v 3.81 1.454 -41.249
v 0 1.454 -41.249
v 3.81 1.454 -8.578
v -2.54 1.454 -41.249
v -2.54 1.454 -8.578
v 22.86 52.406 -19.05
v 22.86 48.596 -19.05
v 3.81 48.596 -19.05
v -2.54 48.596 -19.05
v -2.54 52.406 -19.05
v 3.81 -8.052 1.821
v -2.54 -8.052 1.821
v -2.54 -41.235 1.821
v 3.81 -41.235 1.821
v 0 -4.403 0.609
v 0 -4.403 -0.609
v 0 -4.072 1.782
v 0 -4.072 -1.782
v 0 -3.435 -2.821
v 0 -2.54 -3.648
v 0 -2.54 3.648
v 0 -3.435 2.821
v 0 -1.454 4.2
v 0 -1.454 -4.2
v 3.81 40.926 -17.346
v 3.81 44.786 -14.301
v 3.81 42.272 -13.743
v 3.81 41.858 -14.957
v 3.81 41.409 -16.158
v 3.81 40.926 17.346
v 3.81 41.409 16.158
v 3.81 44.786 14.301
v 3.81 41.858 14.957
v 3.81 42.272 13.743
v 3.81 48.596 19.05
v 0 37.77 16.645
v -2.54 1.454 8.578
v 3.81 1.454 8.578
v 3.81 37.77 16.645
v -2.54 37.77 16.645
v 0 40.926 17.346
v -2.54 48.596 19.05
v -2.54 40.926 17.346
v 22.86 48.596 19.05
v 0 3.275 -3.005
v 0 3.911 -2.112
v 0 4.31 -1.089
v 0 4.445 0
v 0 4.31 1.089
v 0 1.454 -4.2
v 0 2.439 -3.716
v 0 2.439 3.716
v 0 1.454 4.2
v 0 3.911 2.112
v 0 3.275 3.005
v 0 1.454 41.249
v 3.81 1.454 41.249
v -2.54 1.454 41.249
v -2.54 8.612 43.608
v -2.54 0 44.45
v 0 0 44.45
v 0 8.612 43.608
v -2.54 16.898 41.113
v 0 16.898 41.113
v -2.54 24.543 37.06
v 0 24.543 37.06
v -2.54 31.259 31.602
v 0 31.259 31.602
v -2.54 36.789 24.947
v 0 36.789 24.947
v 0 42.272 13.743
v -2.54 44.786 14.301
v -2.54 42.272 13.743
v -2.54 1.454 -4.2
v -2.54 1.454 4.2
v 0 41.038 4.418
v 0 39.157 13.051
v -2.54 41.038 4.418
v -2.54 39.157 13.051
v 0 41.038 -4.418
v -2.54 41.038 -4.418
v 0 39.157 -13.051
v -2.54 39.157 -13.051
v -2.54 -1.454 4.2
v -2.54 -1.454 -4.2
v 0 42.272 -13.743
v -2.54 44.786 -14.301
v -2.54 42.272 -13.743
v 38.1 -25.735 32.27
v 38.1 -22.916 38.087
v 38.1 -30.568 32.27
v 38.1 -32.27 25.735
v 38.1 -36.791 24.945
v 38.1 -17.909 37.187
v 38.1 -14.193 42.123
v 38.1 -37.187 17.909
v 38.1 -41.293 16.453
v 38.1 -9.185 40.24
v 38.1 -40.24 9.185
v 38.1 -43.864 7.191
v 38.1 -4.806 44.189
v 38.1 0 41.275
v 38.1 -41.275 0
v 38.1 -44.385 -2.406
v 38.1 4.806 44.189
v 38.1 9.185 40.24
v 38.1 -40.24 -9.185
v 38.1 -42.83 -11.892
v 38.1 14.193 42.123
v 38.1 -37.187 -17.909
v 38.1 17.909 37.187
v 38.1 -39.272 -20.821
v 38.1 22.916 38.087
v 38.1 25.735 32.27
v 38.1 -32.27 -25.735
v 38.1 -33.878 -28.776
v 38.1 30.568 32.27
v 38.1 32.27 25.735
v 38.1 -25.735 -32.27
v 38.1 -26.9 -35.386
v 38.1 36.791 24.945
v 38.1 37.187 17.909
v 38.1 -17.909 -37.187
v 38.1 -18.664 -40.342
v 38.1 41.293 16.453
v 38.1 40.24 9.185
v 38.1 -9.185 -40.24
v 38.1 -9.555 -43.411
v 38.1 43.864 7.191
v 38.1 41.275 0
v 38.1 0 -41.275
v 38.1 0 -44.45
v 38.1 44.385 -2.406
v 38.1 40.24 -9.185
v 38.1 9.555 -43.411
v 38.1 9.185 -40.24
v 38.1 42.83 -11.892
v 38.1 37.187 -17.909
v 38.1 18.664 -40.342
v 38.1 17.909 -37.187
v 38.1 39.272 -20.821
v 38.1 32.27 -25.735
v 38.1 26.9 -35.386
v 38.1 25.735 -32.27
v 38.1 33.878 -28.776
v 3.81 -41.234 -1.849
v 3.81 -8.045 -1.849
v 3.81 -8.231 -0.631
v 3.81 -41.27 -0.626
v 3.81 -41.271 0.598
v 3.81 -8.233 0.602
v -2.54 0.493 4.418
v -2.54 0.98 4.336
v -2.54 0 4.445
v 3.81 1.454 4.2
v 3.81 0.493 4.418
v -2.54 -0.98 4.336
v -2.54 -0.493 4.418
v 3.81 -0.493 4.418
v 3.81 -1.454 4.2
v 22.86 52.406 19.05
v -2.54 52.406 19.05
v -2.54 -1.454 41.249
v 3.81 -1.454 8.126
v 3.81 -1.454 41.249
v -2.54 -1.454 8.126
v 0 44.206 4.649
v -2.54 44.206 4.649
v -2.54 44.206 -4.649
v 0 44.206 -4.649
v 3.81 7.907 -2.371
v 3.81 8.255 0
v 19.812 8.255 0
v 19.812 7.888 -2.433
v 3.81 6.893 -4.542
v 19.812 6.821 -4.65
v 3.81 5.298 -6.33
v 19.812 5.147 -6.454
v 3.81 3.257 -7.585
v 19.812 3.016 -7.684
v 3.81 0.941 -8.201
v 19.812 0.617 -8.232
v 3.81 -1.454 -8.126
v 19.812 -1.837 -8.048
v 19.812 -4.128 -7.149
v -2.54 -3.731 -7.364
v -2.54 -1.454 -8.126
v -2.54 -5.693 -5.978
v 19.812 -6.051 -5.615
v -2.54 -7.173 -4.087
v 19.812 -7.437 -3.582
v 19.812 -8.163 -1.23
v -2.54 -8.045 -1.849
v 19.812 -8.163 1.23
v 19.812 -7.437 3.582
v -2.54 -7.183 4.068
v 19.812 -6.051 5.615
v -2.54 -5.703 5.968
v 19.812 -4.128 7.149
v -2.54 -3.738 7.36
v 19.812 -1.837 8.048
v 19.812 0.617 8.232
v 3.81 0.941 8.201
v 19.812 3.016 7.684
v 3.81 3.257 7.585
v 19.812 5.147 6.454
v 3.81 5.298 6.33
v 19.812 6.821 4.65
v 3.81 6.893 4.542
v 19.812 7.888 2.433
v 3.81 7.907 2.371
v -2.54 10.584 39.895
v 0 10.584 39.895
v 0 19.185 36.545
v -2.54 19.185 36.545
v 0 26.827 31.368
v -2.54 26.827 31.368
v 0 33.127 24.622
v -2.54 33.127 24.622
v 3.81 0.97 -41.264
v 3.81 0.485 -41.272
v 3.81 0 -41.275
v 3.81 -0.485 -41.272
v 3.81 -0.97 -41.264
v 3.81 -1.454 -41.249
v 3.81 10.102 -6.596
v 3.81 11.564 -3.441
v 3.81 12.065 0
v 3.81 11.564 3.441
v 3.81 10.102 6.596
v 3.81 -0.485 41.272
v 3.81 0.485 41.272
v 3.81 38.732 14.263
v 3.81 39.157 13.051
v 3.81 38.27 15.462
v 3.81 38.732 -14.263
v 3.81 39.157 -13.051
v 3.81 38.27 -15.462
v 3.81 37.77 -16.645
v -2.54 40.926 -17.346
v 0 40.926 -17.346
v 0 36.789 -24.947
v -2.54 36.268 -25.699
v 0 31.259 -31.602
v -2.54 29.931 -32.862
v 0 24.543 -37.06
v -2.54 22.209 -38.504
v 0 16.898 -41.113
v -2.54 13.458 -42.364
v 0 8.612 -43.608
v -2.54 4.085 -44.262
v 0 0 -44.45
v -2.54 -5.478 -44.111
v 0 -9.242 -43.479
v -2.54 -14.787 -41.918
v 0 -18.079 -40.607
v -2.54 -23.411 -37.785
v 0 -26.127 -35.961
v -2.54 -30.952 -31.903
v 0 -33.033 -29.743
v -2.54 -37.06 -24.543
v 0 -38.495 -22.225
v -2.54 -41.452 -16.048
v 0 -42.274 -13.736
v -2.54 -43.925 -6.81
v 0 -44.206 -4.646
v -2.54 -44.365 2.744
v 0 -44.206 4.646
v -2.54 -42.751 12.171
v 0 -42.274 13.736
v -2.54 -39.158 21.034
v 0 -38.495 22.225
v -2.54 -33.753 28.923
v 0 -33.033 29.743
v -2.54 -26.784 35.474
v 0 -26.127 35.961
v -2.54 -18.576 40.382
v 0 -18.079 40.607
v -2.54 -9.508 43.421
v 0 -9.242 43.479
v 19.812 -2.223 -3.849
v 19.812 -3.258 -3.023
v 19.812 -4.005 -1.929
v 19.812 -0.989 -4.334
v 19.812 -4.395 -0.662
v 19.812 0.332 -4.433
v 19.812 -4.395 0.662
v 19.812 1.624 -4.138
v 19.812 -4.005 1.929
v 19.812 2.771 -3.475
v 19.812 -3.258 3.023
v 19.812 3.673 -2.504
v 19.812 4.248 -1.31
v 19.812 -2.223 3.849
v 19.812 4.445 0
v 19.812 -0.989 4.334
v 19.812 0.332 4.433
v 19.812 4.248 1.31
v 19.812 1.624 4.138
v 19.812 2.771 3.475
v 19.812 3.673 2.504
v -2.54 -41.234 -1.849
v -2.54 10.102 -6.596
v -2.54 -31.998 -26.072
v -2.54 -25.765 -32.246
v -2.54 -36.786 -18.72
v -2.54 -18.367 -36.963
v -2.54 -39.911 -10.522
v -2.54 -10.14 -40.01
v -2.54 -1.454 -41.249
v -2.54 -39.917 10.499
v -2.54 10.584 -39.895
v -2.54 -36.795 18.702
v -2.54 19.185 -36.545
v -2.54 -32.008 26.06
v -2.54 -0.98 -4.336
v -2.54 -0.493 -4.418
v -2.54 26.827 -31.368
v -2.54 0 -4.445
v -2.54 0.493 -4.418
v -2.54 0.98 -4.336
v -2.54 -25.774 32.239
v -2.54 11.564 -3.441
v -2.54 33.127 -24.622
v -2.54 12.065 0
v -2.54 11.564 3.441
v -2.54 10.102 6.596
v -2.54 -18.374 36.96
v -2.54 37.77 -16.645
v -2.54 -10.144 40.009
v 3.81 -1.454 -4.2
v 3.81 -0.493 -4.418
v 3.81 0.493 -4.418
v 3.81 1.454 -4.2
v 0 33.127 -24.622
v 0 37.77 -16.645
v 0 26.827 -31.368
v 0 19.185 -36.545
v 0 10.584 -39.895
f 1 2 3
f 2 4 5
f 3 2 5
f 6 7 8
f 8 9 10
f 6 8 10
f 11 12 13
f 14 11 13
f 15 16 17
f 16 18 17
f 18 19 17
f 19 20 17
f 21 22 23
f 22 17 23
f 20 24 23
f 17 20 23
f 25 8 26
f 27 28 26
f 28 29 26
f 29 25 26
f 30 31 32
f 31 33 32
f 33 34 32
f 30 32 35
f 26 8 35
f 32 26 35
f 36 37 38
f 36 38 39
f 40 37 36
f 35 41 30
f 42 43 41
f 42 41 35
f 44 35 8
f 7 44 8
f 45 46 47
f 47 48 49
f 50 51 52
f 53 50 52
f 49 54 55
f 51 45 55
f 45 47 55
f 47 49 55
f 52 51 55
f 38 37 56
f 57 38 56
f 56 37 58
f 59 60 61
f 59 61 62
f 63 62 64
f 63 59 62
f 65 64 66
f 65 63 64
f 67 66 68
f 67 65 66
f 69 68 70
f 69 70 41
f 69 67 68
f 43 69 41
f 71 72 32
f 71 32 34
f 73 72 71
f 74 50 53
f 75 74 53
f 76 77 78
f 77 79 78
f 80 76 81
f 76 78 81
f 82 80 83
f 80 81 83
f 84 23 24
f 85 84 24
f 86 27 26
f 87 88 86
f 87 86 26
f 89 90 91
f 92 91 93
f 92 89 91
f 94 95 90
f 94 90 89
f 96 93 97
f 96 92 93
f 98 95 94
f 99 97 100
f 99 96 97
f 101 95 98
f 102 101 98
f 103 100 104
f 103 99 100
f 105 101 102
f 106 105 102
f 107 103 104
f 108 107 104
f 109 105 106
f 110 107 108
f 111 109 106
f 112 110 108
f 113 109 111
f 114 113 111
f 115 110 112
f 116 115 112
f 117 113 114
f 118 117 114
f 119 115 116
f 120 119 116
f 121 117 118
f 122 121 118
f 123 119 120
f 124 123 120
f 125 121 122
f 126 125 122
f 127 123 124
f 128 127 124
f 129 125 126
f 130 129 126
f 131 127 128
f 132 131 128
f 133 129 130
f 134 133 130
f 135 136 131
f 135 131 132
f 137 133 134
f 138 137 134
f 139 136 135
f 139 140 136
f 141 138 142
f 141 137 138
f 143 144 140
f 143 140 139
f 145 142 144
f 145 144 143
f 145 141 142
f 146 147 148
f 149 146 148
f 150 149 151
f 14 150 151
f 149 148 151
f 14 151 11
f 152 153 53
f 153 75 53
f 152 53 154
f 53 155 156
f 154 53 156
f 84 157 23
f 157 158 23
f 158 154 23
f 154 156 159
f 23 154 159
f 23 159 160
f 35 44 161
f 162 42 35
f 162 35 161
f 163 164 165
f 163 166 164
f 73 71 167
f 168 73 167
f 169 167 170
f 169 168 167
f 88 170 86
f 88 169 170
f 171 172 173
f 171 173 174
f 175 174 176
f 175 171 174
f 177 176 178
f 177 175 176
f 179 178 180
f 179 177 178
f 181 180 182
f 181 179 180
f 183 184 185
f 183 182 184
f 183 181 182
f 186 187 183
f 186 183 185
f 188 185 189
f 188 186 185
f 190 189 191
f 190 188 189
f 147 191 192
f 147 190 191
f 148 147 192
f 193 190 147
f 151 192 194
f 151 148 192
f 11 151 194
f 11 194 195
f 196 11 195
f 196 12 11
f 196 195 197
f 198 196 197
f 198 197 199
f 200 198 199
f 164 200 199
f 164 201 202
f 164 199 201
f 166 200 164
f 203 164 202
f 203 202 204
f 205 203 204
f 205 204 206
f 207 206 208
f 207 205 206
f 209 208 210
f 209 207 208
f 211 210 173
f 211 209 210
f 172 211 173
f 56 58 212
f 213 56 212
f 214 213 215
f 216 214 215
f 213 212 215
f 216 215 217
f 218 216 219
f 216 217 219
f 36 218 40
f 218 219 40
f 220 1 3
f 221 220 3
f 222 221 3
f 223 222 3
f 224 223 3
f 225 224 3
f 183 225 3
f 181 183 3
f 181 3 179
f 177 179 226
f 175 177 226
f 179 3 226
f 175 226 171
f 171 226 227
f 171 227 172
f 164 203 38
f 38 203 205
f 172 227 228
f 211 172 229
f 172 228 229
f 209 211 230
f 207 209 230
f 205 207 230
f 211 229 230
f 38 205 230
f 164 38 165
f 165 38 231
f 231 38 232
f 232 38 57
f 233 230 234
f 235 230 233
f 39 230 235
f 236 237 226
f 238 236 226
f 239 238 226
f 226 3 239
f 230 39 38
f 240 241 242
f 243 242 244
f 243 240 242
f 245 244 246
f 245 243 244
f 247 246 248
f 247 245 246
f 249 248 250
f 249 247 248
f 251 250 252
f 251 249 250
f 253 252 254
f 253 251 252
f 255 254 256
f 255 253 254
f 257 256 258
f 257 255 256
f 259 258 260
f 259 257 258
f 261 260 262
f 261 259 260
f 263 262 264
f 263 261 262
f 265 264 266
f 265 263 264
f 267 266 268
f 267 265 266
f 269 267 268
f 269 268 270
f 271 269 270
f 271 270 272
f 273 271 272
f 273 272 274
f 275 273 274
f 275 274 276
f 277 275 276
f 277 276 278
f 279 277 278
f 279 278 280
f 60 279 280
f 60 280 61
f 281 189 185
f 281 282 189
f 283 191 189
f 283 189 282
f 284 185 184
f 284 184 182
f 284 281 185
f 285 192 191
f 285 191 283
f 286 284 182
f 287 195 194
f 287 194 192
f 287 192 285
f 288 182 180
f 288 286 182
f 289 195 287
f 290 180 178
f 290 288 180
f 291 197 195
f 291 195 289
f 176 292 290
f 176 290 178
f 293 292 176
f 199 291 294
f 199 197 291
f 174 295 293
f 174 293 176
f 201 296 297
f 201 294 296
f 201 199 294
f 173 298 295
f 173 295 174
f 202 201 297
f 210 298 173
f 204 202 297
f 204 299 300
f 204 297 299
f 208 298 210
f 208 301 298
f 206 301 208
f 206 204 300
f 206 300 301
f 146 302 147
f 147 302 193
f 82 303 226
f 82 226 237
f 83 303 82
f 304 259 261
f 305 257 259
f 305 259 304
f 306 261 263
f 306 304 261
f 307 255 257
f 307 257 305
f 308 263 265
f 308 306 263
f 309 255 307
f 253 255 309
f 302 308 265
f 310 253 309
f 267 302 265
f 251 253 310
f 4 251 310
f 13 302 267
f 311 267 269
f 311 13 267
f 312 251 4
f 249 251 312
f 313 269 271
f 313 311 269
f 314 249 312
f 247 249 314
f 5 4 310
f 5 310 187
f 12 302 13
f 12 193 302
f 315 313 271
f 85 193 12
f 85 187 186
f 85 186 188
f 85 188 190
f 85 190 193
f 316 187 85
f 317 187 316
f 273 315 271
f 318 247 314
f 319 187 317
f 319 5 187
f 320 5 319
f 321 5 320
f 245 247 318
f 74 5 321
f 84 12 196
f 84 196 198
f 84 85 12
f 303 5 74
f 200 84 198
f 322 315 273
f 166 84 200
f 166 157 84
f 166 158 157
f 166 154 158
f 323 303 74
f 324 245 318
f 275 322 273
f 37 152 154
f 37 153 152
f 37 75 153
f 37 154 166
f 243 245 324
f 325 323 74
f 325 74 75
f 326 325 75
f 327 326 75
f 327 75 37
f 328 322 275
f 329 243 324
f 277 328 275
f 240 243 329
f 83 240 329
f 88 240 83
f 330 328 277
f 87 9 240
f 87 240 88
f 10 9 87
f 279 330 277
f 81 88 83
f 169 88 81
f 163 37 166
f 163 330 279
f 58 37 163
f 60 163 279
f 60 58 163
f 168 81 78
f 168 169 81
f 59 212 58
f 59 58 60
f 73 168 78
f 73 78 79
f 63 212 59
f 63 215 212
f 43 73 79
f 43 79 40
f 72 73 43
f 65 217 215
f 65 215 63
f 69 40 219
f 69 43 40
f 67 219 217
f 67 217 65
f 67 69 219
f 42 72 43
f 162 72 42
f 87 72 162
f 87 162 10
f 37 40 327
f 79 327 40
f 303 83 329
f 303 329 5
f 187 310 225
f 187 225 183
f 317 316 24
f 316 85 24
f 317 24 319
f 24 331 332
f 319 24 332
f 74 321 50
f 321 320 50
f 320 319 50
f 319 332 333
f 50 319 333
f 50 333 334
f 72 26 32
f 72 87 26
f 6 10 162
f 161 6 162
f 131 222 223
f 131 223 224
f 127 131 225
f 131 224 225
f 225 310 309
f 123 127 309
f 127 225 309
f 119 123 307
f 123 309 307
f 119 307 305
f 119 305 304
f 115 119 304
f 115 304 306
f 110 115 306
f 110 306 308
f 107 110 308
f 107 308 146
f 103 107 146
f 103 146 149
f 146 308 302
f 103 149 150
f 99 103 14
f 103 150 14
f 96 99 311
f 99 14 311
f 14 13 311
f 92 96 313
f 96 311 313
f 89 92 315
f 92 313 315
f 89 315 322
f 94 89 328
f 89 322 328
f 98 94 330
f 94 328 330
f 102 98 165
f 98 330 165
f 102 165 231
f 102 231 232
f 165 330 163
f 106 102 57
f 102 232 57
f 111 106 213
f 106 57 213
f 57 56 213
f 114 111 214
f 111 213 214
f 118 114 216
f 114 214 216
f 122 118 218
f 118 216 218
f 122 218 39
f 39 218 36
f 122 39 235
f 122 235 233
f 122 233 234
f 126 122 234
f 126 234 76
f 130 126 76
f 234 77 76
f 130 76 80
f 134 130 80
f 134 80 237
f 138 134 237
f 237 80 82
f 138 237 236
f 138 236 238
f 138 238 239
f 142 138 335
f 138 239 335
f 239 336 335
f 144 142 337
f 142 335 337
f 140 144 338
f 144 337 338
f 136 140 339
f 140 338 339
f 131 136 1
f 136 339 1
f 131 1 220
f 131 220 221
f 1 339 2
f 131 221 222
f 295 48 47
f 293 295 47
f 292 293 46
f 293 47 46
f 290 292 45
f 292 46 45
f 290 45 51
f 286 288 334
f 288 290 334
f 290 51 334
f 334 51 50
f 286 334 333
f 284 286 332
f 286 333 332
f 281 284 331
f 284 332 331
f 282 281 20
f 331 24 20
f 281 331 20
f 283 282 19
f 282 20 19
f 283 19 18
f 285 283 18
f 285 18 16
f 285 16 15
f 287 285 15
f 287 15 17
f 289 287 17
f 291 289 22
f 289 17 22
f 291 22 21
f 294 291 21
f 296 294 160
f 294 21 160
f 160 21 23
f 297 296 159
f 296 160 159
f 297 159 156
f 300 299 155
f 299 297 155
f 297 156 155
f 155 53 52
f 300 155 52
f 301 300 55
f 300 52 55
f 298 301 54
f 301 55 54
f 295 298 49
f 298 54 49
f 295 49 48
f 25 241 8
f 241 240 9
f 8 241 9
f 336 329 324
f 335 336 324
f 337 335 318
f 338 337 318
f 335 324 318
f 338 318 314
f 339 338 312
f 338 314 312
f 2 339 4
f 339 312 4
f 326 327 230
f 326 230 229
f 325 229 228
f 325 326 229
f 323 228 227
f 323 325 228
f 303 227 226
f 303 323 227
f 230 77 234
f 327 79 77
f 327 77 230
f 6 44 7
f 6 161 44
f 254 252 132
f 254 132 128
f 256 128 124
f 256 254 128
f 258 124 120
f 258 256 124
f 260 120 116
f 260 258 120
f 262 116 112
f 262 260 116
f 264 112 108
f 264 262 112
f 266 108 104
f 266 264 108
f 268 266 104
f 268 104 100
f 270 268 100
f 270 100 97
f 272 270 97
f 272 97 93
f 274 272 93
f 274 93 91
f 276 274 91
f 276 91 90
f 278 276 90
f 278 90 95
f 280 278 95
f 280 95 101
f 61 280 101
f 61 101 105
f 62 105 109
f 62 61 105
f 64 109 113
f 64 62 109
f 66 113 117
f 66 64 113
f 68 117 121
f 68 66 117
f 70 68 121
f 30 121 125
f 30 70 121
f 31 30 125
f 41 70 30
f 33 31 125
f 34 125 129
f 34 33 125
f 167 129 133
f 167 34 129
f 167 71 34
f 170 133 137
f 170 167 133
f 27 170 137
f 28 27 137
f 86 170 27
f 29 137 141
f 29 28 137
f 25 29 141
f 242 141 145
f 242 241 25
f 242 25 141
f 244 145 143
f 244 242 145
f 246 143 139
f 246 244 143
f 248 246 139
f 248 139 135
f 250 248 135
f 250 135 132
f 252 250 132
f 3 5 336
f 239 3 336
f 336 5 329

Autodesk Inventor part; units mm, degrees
ref_plane "YZ Plane" through (0, 0, 0) normal (1, 0, 0) x (0, 1, 0)
ref_plane "XZ Plane" through (0, 0, 0) normal (0, 1, 0) x (-1, 0, 0)
ref_plane "XY Plane" through (0, 0, 0) normal (0, 0, 1) x (1, 0, 0)
sketch "Sketch1" plane through (0, 0, 0) normal (1, 0, 0) x (0, 1, 0)
  circle A0 centre (0, 0) radius 4.445
  circle A1 centre (0, 0) radius 8.255
  dimension "d0" = 8.89
  dimension "d1" = 3.81
extrude "Extrusion1" add sketch "Sketch1" along normal blind 19.812
sketch "Sketch2" plane through (0, 0, 0) normal (-1, 0, 0) x (0, 0, 1)
  circle A0 centre (0, 0) radius 8.255
  circle A1 centre (0, 0) radius 7.747
  circle A2 centre (0, 0) radius 8.255 projected
  dimension "d42" = 0
extrude "Extrusion2" add sketch "Sketch2" along normal blind 2.54 contours A0 | A1
sketch "Sketch3" plane through (-2.54, 0, 0) normal (-1, 0, 0) x (0, 0, 1)
  line L0 (19.05, 48.5955) -> (-19.05, 48.5955)
  circle A0 centre (0, 0) radius 8.255 projected
  line L1 (8.255, 0) -> (19.05, 48.5955)
  line L2 (-8.255, 0) -> (-19.05, 48.5955)
  arc A1 (8.255, 0) -> (-8.255, 0) centre (0, 0) ccw
  line L3 (-14.3008, 44.7855) -> (14.3008, 44.7855)
  line L4 (14.3008, 44.7855) -> (6.5962, 10.1022)
  arc A2 (6.5962, 10.1022) -> (-6.5962, 10.1022) centre (0, 0) ccw
  line L5 (-6.5962, 10.1022) -> (-14.3008, 44.7855)
  dimension "d6" = 38.1
  dimension "d7" = 19.05
  dimension "d8" = 3.81
extrude "Extrusion3" add sketch "Sketch3" against normal blind 6.35 contours L1 A0 L2 L0
sketch "Sketch6" plane through (-2.54, 44.7855, -14.3008) normal (0, -1, 0) x (1, 0, 0)
  line L0 (6.35, 32.4159) -> (26.9875, 32.4159) projected
  line L1 (13.4874, 32.4159) -> (13.4874, 26.0989)
  line L2 (26.9875, 32.4159) -> (26.9875, -3.9117) projected
  point P0 (2.54, 14.3008)
  dimension "d20" = 13.5001
sketch "Sketch10" plane through (0, 0, 0) normal (1, 0, 0) x (0, 0, -1)
  circle A0 centre (0, 0) radius 1.4542
  line L0 (-4.445, 1.4542) -> (4.445, 1.4542)
  line L1 (4.445, 1.4542) -> (4.445, -1.4542)
  line L2 (4.445, -1.4542) -> (-4.445, -1.4542)
  line L3 (-4.445, -1.4542) -> (-4.445, 1.4542)
  circle A1 centre (0, 0) radius 4.445 projected
  dimension "d43" = 0
  dimension "d44" = 0
extrude "Extrusion7" cut sketch "Sketch10" against normal blind 22.225 contours A0 | A0 L0 A1 L2 | A0 L2 A1 L0 | A1 L3 L0 | L0 L1 A1 | A1 L1 L2 | L2 L3 A1
sketch "Sketch13" plane through (-2.54, 48.5955, 19.05) normal (0, 1, 0) x (1, 0, 0)
  line L0 (4.6355, 36.83) -> (1.7145, 36.83)
  line L1 (1.7145, 36.83) -> (1.7145, 33.909)
  line L2 (1.7145, 33.909) -> (4.6355, 33.909)
  line L3 (4.6355, 33.909) -> (4.6355, 36.83)
  line L4 (6.35, 38.1) -> (6.35, 0) projected
  line L5 (0, 38.1) -> (6.35, 38.1) projected
  line L6 (4.6228, 4.191) -> (1.7018, 4.191)
  line L7 (1.7018, 4.191) -> (1.7018, 1.27)
  line L8 (1.7018, 1.27) -> (4.6228, 1.27)
  line L9 (4.6228, 1.27) -> (4.6228, 4.191)
  line L10 (0, 0) -> (6.35, 0) projected
  line L11 (0, 0) -> (0, 38.1) projected
  line L12 (0, 0) -> (6.35, 0) projected
  line L13 (6.35, 38.1) -> (6.35, 0) projected
  line L14 (0, 38.1) -> (6.35, 38.1) projected
  point P0 (2.54, 19.05)
  dimension "d32" = 2.921
  dimension "d33" = 2.921
  dimension "d34" = 1.7145
  dimension "d35" = 1.27
  dimension "d36" = 2.921
  dimension "d37" = 2.921
  dimension "d38" = 1.7272
  dimension "d39" = 1.27
extrude "Extrusion9" add sketch "Sketch13" along normal blind 3.81 contours L3 L2 L1 L0 | L4 L10 L11 L5 | L9 L8 L7 L6
sketch "Sketch14" plane through (0, 0, 0) normal (-1, 0, 0) x (0, 0, 1)
  arc A0 (4.2004, -1.4542) -> (4.445, 0) centre (0, 0) ccw projected
  line L0 (4.2004, -1.4542) -> (4.445, -1.4542) projected
  line L1 (4.445, -1.4542) -> (4.445, 0) projected
  arc A1 (4.445, 0) -> (4.2004, 1.4542) centre (0, 0) ccw projected
  line L2 (4.445, 0) -> (4.445, 1.4542) projected
  line L3 (4.445, 1.4542) -> (4.2004, 1.4542) projected
  arc A2 (-4.445, 0) -> (-4.2004, -1.4542) centre (0, 0) ccw projected
  line L4 (-4.445, 0) -> (-4.445, -1.4542) projected
  line L5 (-4.445, -1.4542) -> (-4.2004, -1.4542) projected
  arc A3 (-4.2004, 1.4542) -> (-4.445, 0) centre (0, 0) ccw projected
  line L6 (-4.2004, 1.4542) -> (-4.445, 1.4542) projected
  line L7 (-4.445, 1.4542) -> (-4.445, 0) projected
extrude "Extrusion10" add sketch "Sketch14" along normal blind 2.54
sketch "Sketch15" plane through (-2.54, 0, 0) normal (-1, 0, 0) x (0, 0, 1)
  circle A0 centre (0, 0) radius 41.275
  circle A1 centre (0, 0) radius 44.45
  dimension "d47" = 82.55
  dimension "d48" = 88.9
extrude "Extrusion11" add sketch "Sketch15" against normal blind 2.54
sketch "Sketch16" plane through (0, 0, 0) normal (1, 0, 0) x (0, 0, -1)
  circle A0 centre (0, 0) radius 44.45
  circle A1 centre (0, 0) radius 41.275
  dimension "d51" = 82.55
extrude "Extrusion12" add sketch "Sketch16" along normal blind 38.1
sketch "Sketch19" plane through (-2.54, 0, 0) normal (-1, 0, 0) x (0, 0, 1)
  line L0 (4.2004, 1.4542) -> (-4.2004, 1.4542) projected
  arc A0 (-16.6452, 37.7699) -> (16.6452, 37.7699) centre (0, 0) ccw projected
  line L1 (-4.2004, 1.4542) -> (-41.2494, 1.4542)
  line L2 (4.2004, 1.4542) -> (41.2494, 1.4542)
  circle A1 centre (0, 0) radius 8.382
  line L3 (-4.2004, -1.4542) -> (4.2004, -1.4542)
  line L4 (4.2004, 1.4542) -> (-4.2004, 1.4542)
  line L5 (-41.2494, -1.4542) -> (41.2494, -1.4542)
extrude "Extrusion14" add sketch "Sketch19" against normal blind 6.35 contours L2 A1 L5 L3 L1 L0 | L2 A0 L5 A1 | A1 L5 A0 L1
sketch "Sketch20" plane through (3.81, 0, 0) normal (1, 0, 0) x (0, 0, -1)
  arc A0 (4.2004, -1.4542) -> (4.2004, 1.4542) centre (0, 0) ccw projected
  line L0 (4.2004, 1.4542) -> (-4.2004, 1.4542) projected
  arc A1 (-4.2004, 1.4542) -> (-4.2004, -1.4542) centre (0, 0) ccw projected
  line L1 (-4.2004, -1.4542) -> (4.2004, -1.4542) projected
extrude "Extrusion15" cut sketch "Sketch20" against normal blind 6.35
sketch "Sketch21" plane through (-2.54, 0, 0) normal (-1, 0, 0) x (0, 0, 1)
  arc A0 (-8.1259, -1.4542) -> (8.1259, -1.4542) centre (0, 0) ccw projected
  line L0 (1.8212, -8.0516) -> (1.8212, -41.2348)
  arc A1 (-41.2494, -1.4542) -> (41.2494, -1.4542) centre (0, 0) ccw projected
  line L1 (-1.8492, -41.2336) -> (-1.8492, -8.1755)
  arc A2 (-1.8492, -41.2336) -> (1.8212, -41.2348) centre (0, 0) ccw
  line L2 (-1.8492, -8.1755) -> (-1.8492, -8.0452)
extrude "Extrusion16" add sketch "Sketch21" against normal blind 6.35
sketch "Sketch23" plane through (3.81, 0, 0) normal (1, 0, 0) x (0, 0, -1)
  line L0 (19.05, 52.4055) -> (-19.05, 52.4055) projected
  line L1 (-19.05, 48.5955) -> (-19.05, 52.4055) projected
  line L2 (19.05, 52.4055) -> (-19.05, 52.4055)
  line L3 (-19.05, 52.4055) -> (-19.05, 48.5955)
  line L4 (-19.05, 48.5955) -> (19.05, 48.5955)
  line L5 (19.05, 48.5955) -> (19.05, 52.4055)
  point P0 (0, 0)
extrude "Extrusion17" add sketch "Sketch23" along normal blind 19.05
properties part number "BasicThrustMotorHousing"
